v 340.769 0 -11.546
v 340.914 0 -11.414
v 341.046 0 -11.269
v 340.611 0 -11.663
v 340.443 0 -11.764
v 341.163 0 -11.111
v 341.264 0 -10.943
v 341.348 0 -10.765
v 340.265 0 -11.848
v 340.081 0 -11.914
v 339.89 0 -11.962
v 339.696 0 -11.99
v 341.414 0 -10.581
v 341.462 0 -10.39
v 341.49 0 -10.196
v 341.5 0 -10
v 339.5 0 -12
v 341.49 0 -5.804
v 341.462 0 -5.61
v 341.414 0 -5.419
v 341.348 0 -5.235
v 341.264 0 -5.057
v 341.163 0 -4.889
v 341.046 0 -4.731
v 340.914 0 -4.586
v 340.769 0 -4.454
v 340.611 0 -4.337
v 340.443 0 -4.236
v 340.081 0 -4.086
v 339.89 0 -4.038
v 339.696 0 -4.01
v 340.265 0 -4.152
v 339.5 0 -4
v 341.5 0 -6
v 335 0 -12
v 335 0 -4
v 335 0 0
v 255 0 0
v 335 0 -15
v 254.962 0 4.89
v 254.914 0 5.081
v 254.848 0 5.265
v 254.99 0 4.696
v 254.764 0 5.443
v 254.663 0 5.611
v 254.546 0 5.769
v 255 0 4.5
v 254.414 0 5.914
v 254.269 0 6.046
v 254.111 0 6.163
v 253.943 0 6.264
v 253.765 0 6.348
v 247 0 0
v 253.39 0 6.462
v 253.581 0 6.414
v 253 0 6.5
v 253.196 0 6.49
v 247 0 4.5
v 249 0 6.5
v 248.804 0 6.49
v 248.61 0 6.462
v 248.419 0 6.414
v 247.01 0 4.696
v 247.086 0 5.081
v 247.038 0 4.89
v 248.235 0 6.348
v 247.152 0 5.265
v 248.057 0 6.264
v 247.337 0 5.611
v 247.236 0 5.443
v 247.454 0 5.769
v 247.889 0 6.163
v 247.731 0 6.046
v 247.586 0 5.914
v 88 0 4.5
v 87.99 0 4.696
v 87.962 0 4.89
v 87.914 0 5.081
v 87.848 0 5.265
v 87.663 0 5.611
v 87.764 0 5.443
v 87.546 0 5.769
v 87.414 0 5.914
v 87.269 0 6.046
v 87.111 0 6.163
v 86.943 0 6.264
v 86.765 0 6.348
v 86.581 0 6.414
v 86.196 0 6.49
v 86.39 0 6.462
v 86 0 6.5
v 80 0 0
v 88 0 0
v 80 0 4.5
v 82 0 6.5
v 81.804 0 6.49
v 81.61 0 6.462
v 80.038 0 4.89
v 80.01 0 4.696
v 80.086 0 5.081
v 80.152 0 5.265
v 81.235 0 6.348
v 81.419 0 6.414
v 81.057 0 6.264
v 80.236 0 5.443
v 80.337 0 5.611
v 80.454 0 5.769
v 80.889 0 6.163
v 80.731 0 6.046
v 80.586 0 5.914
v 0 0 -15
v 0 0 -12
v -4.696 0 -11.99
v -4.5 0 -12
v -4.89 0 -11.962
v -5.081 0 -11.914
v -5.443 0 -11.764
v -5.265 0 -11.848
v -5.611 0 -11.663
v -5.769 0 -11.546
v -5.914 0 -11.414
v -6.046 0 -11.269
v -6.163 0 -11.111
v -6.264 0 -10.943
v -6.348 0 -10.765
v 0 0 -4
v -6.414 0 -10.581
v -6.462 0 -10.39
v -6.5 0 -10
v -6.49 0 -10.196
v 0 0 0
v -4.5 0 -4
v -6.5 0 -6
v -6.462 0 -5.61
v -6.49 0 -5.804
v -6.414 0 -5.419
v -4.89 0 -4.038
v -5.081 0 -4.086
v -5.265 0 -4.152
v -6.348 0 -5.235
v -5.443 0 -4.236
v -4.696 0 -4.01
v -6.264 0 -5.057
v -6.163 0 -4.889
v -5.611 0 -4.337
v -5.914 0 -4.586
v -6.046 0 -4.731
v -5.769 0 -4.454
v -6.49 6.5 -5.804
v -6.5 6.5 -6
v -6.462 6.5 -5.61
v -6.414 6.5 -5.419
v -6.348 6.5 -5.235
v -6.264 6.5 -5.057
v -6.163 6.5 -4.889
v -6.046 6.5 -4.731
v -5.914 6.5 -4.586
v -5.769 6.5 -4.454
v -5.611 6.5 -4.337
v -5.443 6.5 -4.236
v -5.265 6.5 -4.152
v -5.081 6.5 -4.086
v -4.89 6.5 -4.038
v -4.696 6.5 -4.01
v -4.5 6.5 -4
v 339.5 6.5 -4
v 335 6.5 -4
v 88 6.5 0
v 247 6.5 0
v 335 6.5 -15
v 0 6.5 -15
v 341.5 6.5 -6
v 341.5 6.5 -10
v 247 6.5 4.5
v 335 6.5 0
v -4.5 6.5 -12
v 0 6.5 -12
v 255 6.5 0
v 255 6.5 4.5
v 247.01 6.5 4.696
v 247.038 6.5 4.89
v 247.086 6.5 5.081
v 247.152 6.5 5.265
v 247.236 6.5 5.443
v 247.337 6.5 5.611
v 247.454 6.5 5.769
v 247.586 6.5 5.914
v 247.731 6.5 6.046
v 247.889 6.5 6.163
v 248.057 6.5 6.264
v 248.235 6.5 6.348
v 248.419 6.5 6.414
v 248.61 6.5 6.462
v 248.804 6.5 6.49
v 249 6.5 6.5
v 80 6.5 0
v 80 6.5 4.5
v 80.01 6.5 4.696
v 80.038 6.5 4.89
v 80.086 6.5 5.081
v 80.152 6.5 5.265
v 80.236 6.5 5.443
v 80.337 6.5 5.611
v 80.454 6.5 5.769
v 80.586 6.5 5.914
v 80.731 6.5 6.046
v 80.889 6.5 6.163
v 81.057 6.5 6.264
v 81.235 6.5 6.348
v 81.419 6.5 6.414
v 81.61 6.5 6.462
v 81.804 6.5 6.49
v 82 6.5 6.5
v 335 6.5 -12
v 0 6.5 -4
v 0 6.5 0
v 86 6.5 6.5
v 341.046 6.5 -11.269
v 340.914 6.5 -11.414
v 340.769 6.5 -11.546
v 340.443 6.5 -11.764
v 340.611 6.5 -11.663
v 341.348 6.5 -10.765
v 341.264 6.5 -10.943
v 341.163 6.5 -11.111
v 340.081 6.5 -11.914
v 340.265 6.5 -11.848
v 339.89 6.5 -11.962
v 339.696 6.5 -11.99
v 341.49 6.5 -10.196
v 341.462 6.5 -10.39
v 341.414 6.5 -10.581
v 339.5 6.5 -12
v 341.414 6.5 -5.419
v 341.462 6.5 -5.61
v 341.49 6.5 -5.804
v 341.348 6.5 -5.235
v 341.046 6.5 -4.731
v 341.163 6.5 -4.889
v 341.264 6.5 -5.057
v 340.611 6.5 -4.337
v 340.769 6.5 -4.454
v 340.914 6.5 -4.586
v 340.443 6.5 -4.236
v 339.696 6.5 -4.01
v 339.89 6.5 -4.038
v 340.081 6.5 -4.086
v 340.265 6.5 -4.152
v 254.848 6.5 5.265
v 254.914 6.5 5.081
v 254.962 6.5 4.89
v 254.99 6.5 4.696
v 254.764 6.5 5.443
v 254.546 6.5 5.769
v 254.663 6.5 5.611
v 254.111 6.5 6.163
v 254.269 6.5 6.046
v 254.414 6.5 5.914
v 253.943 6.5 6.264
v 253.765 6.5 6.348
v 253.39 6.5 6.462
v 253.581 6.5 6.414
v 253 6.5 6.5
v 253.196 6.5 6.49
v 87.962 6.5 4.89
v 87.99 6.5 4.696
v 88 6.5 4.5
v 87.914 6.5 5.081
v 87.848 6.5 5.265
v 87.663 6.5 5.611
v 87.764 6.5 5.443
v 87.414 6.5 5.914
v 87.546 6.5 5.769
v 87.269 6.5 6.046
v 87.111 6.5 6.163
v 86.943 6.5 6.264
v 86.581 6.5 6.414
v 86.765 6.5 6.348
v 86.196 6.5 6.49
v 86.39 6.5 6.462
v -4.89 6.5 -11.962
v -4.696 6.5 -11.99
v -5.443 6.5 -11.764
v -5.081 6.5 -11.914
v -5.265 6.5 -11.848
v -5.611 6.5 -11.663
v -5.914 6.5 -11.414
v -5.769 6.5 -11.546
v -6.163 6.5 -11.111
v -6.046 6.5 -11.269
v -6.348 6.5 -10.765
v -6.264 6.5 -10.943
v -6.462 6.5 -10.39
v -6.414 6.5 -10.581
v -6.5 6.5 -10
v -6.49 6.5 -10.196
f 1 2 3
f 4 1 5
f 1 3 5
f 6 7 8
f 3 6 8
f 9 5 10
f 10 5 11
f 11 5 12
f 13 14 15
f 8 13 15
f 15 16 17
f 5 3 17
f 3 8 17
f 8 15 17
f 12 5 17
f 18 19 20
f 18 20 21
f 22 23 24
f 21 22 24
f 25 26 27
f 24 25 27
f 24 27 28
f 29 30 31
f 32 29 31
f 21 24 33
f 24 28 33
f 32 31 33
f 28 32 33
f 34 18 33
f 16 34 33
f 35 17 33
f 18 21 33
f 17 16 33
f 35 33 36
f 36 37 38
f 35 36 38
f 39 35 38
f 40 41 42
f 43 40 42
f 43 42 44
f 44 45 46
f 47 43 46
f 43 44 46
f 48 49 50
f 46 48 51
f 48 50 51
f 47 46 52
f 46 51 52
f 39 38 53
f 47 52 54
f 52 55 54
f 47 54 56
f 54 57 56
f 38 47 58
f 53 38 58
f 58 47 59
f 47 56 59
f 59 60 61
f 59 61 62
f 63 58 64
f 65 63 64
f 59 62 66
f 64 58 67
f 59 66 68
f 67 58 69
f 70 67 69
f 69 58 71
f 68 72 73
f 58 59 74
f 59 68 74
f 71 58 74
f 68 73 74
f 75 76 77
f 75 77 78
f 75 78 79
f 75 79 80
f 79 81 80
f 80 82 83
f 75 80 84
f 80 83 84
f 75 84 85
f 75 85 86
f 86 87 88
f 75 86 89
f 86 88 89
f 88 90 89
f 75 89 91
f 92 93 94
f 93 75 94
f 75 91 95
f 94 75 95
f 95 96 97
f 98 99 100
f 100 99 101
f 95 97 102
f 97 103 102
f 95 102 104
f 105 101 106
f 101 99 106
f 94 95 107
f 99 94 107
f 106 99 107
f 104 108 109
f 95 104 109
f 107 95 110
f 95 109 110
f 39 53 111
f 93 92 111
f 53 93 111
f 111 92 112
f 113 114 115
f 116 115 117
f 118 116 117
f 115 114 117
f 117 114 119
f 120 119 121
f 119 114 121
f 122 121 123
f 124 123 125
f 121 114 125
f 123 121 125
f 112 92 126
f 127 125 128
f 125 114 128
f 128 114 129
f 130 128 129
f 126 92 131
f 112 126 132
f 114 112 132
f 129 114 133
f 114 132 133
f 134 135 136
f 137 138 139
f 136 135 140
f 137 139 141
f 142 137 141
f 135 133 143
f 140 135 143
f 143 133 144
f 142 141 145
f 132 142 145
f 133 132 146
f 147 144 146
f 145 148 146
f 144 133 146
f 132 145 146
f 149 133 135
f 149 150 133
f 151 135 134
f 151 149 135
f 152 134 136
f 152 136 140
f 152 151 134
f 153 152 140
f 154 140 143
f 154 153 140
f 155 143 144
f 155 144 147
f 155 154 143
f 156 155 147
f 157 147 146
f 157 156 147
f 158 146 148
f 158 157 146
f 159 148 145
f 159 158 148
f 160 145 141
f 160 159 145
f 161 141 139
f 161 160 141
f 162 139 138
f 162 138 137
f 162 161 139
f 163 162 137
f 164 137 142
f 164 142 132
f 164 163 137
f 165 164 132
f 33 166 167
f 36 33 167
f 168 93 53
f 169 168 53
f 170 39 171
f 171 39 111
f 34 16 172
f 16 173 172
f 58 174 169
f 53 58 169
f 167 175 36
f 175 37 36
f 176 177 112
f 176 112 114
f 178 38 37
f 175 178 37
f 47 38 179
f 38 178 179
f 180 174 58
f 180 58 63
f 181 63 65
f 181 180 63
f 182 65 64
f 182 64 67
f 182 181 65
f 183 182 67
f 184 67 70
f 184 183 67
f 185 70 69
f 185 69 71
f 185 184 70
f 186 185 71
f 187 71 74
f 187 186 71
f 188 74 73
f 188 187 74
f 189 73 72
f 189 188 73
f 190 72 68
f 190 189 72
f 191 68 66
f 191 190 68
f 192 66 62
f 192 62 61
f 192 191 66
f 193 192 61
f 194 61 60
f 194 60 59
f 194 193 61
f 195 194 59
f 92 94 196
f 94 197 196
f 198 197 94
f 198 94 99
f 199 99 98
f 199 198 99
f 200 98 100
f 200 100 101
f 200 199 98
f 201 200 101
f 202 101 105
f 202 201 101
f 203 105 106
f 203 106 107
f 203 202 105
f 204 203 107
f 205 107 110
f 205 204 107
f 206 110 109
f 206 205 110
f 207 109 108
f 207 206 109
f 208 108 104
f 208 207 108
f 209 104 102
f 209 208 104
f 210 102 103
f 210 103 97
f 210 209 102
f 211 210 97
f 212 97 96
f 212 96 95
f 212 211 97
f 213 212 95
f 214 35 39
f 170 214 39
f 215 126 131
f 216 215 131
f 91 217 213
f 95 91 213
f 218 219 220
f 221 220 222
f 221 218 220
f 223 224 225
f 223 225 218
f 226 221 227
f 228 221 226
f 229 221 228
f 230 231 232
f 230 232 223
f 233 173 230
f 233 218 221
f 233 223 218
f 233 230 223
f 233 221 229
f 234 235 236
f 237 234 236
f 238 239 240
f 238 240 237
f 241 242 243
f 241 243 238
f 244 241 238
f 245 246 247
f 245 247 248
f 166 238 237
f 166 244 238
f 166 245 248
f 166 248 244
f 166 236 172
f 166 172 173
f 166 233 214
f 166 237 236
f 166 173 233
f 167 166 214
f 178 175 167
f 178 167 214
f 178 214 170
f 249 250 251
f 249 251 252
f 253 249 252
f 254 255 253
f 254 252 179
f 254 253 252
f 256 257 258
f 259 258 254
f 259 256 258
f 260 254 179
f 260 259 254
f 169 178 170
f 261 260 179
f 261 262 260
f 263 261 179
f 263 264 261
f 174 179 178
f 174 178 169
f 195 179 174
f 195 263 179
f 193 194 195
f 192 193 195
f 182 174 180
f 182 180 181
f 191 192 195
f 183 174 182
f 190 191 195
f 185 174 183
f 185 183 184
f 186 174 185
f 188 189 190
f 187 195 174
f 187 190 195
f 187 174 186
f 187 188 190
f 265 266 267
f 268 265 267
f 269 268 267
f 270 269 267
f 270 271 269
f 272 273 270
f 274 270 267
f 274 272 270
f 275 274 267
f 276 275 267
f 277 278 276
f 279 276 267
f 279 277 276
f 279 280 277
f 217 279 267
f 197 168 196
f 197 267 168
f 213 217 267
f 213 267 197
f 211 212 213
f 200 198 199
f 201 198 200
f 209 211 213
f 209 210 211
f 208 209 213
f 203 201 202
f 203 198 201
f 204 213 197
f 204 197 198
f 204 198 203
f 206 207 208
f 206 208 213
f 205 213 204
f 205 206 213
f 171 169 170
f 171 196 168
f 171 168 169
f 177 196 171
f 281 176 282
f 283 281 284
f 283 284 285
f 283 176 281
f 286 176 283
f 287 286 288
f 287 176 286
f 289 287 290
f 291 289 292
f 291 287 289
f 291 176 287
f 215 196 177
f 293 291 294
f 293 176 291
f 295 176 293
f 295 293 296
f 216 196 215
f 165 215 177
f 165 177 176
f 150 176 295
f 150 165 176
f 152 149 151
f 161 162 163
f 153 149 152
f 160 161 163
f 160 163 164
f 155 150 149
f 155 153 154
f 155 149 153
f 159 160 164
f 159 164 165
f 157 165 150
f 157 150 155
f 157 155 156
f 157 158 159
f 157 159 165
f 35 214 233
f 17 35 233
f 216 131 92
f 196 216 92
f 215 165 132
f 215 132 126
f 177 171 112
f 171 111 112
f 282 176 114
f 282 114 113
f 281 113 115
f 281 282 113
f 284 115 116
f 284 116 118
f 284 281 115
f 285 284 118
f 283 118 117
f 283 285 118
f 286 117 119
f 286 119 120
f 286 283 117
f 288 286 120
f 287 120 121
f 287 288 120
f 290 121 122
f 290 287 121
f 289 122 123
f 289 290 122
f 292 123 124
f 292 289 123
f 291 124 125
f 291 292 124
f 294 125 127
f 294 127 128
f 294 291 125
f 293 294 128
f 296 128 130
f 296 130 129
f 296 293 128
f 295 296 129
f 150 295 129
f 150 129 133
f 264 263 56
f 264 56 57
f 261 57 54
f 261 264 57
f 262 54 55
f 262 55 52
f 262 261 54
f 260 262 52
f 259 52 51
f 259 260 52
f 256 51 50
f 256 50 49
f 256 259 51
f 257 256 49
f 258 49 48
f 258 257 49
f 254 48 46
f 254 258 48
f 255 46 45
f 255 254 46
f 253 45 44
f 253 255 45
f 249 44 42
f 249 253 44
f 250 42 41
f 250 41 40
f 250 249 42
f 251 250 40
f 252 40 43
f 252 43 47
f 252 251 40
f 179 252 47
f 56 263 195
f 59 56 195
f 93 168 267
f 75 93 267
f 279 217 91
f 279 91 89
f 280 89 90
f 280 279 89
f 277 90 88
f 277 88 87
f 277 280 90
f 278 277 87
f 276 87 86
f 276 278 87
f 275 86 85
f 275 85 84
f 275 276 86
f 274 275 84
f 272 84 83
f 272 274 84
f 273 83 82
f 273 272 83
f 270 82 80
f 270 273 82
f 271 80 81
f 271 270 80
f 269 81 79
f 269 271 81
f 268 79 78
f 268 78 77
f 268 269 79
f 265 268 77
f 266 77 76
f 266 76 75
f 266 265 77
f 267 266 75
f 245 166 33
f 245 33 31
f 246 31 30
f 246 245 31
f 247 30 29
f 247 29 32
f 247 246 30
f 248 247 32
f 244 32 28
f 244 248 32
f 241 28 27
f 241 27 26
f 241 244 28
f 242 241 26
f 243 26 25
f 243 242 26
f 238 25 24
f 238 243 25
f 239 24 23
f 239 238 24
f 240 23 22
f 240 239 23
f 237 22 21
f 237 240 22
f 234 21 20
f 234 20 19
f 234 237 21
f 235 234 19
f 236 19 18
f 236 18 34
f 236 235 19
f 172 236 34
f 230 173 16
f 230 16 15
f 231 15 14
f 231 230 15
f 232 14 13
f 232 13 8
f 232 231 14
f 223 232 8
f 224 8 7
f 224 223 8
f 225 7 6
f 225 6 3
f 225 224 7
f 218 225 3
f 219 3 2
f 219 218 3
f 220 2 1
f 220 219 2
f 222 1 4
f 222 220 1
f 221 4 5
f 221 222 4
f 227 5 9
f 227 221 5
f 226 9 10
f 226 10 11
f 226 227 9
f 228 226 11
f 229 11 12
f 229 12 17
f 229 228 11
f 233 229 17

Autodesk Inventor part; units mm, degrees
ref_plane "YZ Plane" through (0, 0, 0) normal (1, 0, 0) x (0, 1, 0)
ref_plane "XZ Plane" through (0, 0, 0) normal (0, 1, 0) x (-1, 0, 0)
ref_plane "XY Plane" through (0, 0, 0) normal (0, 0, 1) x (1, 0, 0)
sketch "Sketch1" plane through (0, 0, 0) normal (0, 1, 0) x (-1, 0, 0)
  line L0 (0, 0) -> (-335, 0)
  line L1 (-335, 0) -> (-335, -15)
  line L2 (-335, -15) -> (0, -15)
  line L3 (0, -15) -> (0, 0)
  dimension "d0" = 15
  dimension "d1" = 335
extrude "Extrusion1" add sketch "Sketch1" along normal blind 6.5
sketch "Sketch2" plane through (0, 6.5, 0) normal (0, 1, 0) x (1, 0, 0)
  line L0 (0, 0) -> (335, 0) projected
  line L1 (335, 0) -> (335, 15) projected
  line L2 (0, 15) -> (0, 0) projected
  line L3 (0, 12) -> (-4.5, 12)
  line L4 (-6.5, 10) -> (-6.5, 6)
  line L5 (-4.5, 4) -> (0, 4)
  line L6 (0, 4) -> (0, 12)
  line L7 (335, 12) -> (339.5, 12)
  line L8 (341.5, 10) -> (341.5, 6)
  line L9 (339.5, 4) -> (335, 4)
  line L10 (335, 4) -> (335, 12)
  line L11 (80, 0) -> (88, 0)
  line L12 (88, 0) -> (88, -4.5)
  line L13 (86, -6.5) -> (82, -6.5)
  line L14 (80, -4.5) -> (80, 0)
  line L15 (247, 0) -> (255, 0)
  line L16 (255, 0) -> (255, -4.5)
  line L17 (253, -6.5) -> (249, -6.5)
  line L18 (247, -4.5) -> (247, 0)
  arc A0 (-4.5, 12) -> (-6.5, 10) centre (-4.5, 10) ccw
  arc A1 (-6.5, 6) -> (-4.5, 4) centre (-4.5, 6) ccw
  arc A2 (80, -4.5) -> (82, -6.5) centre (82, -4.5) ccw
  arc A3 (86, -6.5) -> (88, -4.5) centre (86, -4.5) ccw
  arc A4 (247, -4.5) -> (249, -6.5) centre (249, -4.5) ccw
  arc A5 (253, -6.5) -> (255, -4.5) centre (253, -4.5) ccw
  arc A6 (339.5, 4) -> (341.5, 6) centre (339.5, 6) ccw
  arc A7 (341.5, 10) -> (339.5, 12) centre (339.5, 10) ccw
  dimension "d4" = 2
  dimension "d5" = 8
  dimension "d6" = 8
  dimension "d7" = 8
  dimension "d8" = 8
  dimension "d9" = 6.5
  dimension "d10" = 6.5
  dimension "d11" = 6.5
  dimension "d12" = 4
  dimension "d13" = 80
  dimension "d14" = 80
extrude "Extrusion2" add sketch "Sketch2" against normal blind 6.5
equation "\"d6\" = d5"
equation "\"d7\" = d6"
equation "\"d8\" = d7"
equation "\"d10\" = d9"
equation "\"d11\" = d9"
equation "\"d14\" = d13"
properties part number "front_upper_brace"
